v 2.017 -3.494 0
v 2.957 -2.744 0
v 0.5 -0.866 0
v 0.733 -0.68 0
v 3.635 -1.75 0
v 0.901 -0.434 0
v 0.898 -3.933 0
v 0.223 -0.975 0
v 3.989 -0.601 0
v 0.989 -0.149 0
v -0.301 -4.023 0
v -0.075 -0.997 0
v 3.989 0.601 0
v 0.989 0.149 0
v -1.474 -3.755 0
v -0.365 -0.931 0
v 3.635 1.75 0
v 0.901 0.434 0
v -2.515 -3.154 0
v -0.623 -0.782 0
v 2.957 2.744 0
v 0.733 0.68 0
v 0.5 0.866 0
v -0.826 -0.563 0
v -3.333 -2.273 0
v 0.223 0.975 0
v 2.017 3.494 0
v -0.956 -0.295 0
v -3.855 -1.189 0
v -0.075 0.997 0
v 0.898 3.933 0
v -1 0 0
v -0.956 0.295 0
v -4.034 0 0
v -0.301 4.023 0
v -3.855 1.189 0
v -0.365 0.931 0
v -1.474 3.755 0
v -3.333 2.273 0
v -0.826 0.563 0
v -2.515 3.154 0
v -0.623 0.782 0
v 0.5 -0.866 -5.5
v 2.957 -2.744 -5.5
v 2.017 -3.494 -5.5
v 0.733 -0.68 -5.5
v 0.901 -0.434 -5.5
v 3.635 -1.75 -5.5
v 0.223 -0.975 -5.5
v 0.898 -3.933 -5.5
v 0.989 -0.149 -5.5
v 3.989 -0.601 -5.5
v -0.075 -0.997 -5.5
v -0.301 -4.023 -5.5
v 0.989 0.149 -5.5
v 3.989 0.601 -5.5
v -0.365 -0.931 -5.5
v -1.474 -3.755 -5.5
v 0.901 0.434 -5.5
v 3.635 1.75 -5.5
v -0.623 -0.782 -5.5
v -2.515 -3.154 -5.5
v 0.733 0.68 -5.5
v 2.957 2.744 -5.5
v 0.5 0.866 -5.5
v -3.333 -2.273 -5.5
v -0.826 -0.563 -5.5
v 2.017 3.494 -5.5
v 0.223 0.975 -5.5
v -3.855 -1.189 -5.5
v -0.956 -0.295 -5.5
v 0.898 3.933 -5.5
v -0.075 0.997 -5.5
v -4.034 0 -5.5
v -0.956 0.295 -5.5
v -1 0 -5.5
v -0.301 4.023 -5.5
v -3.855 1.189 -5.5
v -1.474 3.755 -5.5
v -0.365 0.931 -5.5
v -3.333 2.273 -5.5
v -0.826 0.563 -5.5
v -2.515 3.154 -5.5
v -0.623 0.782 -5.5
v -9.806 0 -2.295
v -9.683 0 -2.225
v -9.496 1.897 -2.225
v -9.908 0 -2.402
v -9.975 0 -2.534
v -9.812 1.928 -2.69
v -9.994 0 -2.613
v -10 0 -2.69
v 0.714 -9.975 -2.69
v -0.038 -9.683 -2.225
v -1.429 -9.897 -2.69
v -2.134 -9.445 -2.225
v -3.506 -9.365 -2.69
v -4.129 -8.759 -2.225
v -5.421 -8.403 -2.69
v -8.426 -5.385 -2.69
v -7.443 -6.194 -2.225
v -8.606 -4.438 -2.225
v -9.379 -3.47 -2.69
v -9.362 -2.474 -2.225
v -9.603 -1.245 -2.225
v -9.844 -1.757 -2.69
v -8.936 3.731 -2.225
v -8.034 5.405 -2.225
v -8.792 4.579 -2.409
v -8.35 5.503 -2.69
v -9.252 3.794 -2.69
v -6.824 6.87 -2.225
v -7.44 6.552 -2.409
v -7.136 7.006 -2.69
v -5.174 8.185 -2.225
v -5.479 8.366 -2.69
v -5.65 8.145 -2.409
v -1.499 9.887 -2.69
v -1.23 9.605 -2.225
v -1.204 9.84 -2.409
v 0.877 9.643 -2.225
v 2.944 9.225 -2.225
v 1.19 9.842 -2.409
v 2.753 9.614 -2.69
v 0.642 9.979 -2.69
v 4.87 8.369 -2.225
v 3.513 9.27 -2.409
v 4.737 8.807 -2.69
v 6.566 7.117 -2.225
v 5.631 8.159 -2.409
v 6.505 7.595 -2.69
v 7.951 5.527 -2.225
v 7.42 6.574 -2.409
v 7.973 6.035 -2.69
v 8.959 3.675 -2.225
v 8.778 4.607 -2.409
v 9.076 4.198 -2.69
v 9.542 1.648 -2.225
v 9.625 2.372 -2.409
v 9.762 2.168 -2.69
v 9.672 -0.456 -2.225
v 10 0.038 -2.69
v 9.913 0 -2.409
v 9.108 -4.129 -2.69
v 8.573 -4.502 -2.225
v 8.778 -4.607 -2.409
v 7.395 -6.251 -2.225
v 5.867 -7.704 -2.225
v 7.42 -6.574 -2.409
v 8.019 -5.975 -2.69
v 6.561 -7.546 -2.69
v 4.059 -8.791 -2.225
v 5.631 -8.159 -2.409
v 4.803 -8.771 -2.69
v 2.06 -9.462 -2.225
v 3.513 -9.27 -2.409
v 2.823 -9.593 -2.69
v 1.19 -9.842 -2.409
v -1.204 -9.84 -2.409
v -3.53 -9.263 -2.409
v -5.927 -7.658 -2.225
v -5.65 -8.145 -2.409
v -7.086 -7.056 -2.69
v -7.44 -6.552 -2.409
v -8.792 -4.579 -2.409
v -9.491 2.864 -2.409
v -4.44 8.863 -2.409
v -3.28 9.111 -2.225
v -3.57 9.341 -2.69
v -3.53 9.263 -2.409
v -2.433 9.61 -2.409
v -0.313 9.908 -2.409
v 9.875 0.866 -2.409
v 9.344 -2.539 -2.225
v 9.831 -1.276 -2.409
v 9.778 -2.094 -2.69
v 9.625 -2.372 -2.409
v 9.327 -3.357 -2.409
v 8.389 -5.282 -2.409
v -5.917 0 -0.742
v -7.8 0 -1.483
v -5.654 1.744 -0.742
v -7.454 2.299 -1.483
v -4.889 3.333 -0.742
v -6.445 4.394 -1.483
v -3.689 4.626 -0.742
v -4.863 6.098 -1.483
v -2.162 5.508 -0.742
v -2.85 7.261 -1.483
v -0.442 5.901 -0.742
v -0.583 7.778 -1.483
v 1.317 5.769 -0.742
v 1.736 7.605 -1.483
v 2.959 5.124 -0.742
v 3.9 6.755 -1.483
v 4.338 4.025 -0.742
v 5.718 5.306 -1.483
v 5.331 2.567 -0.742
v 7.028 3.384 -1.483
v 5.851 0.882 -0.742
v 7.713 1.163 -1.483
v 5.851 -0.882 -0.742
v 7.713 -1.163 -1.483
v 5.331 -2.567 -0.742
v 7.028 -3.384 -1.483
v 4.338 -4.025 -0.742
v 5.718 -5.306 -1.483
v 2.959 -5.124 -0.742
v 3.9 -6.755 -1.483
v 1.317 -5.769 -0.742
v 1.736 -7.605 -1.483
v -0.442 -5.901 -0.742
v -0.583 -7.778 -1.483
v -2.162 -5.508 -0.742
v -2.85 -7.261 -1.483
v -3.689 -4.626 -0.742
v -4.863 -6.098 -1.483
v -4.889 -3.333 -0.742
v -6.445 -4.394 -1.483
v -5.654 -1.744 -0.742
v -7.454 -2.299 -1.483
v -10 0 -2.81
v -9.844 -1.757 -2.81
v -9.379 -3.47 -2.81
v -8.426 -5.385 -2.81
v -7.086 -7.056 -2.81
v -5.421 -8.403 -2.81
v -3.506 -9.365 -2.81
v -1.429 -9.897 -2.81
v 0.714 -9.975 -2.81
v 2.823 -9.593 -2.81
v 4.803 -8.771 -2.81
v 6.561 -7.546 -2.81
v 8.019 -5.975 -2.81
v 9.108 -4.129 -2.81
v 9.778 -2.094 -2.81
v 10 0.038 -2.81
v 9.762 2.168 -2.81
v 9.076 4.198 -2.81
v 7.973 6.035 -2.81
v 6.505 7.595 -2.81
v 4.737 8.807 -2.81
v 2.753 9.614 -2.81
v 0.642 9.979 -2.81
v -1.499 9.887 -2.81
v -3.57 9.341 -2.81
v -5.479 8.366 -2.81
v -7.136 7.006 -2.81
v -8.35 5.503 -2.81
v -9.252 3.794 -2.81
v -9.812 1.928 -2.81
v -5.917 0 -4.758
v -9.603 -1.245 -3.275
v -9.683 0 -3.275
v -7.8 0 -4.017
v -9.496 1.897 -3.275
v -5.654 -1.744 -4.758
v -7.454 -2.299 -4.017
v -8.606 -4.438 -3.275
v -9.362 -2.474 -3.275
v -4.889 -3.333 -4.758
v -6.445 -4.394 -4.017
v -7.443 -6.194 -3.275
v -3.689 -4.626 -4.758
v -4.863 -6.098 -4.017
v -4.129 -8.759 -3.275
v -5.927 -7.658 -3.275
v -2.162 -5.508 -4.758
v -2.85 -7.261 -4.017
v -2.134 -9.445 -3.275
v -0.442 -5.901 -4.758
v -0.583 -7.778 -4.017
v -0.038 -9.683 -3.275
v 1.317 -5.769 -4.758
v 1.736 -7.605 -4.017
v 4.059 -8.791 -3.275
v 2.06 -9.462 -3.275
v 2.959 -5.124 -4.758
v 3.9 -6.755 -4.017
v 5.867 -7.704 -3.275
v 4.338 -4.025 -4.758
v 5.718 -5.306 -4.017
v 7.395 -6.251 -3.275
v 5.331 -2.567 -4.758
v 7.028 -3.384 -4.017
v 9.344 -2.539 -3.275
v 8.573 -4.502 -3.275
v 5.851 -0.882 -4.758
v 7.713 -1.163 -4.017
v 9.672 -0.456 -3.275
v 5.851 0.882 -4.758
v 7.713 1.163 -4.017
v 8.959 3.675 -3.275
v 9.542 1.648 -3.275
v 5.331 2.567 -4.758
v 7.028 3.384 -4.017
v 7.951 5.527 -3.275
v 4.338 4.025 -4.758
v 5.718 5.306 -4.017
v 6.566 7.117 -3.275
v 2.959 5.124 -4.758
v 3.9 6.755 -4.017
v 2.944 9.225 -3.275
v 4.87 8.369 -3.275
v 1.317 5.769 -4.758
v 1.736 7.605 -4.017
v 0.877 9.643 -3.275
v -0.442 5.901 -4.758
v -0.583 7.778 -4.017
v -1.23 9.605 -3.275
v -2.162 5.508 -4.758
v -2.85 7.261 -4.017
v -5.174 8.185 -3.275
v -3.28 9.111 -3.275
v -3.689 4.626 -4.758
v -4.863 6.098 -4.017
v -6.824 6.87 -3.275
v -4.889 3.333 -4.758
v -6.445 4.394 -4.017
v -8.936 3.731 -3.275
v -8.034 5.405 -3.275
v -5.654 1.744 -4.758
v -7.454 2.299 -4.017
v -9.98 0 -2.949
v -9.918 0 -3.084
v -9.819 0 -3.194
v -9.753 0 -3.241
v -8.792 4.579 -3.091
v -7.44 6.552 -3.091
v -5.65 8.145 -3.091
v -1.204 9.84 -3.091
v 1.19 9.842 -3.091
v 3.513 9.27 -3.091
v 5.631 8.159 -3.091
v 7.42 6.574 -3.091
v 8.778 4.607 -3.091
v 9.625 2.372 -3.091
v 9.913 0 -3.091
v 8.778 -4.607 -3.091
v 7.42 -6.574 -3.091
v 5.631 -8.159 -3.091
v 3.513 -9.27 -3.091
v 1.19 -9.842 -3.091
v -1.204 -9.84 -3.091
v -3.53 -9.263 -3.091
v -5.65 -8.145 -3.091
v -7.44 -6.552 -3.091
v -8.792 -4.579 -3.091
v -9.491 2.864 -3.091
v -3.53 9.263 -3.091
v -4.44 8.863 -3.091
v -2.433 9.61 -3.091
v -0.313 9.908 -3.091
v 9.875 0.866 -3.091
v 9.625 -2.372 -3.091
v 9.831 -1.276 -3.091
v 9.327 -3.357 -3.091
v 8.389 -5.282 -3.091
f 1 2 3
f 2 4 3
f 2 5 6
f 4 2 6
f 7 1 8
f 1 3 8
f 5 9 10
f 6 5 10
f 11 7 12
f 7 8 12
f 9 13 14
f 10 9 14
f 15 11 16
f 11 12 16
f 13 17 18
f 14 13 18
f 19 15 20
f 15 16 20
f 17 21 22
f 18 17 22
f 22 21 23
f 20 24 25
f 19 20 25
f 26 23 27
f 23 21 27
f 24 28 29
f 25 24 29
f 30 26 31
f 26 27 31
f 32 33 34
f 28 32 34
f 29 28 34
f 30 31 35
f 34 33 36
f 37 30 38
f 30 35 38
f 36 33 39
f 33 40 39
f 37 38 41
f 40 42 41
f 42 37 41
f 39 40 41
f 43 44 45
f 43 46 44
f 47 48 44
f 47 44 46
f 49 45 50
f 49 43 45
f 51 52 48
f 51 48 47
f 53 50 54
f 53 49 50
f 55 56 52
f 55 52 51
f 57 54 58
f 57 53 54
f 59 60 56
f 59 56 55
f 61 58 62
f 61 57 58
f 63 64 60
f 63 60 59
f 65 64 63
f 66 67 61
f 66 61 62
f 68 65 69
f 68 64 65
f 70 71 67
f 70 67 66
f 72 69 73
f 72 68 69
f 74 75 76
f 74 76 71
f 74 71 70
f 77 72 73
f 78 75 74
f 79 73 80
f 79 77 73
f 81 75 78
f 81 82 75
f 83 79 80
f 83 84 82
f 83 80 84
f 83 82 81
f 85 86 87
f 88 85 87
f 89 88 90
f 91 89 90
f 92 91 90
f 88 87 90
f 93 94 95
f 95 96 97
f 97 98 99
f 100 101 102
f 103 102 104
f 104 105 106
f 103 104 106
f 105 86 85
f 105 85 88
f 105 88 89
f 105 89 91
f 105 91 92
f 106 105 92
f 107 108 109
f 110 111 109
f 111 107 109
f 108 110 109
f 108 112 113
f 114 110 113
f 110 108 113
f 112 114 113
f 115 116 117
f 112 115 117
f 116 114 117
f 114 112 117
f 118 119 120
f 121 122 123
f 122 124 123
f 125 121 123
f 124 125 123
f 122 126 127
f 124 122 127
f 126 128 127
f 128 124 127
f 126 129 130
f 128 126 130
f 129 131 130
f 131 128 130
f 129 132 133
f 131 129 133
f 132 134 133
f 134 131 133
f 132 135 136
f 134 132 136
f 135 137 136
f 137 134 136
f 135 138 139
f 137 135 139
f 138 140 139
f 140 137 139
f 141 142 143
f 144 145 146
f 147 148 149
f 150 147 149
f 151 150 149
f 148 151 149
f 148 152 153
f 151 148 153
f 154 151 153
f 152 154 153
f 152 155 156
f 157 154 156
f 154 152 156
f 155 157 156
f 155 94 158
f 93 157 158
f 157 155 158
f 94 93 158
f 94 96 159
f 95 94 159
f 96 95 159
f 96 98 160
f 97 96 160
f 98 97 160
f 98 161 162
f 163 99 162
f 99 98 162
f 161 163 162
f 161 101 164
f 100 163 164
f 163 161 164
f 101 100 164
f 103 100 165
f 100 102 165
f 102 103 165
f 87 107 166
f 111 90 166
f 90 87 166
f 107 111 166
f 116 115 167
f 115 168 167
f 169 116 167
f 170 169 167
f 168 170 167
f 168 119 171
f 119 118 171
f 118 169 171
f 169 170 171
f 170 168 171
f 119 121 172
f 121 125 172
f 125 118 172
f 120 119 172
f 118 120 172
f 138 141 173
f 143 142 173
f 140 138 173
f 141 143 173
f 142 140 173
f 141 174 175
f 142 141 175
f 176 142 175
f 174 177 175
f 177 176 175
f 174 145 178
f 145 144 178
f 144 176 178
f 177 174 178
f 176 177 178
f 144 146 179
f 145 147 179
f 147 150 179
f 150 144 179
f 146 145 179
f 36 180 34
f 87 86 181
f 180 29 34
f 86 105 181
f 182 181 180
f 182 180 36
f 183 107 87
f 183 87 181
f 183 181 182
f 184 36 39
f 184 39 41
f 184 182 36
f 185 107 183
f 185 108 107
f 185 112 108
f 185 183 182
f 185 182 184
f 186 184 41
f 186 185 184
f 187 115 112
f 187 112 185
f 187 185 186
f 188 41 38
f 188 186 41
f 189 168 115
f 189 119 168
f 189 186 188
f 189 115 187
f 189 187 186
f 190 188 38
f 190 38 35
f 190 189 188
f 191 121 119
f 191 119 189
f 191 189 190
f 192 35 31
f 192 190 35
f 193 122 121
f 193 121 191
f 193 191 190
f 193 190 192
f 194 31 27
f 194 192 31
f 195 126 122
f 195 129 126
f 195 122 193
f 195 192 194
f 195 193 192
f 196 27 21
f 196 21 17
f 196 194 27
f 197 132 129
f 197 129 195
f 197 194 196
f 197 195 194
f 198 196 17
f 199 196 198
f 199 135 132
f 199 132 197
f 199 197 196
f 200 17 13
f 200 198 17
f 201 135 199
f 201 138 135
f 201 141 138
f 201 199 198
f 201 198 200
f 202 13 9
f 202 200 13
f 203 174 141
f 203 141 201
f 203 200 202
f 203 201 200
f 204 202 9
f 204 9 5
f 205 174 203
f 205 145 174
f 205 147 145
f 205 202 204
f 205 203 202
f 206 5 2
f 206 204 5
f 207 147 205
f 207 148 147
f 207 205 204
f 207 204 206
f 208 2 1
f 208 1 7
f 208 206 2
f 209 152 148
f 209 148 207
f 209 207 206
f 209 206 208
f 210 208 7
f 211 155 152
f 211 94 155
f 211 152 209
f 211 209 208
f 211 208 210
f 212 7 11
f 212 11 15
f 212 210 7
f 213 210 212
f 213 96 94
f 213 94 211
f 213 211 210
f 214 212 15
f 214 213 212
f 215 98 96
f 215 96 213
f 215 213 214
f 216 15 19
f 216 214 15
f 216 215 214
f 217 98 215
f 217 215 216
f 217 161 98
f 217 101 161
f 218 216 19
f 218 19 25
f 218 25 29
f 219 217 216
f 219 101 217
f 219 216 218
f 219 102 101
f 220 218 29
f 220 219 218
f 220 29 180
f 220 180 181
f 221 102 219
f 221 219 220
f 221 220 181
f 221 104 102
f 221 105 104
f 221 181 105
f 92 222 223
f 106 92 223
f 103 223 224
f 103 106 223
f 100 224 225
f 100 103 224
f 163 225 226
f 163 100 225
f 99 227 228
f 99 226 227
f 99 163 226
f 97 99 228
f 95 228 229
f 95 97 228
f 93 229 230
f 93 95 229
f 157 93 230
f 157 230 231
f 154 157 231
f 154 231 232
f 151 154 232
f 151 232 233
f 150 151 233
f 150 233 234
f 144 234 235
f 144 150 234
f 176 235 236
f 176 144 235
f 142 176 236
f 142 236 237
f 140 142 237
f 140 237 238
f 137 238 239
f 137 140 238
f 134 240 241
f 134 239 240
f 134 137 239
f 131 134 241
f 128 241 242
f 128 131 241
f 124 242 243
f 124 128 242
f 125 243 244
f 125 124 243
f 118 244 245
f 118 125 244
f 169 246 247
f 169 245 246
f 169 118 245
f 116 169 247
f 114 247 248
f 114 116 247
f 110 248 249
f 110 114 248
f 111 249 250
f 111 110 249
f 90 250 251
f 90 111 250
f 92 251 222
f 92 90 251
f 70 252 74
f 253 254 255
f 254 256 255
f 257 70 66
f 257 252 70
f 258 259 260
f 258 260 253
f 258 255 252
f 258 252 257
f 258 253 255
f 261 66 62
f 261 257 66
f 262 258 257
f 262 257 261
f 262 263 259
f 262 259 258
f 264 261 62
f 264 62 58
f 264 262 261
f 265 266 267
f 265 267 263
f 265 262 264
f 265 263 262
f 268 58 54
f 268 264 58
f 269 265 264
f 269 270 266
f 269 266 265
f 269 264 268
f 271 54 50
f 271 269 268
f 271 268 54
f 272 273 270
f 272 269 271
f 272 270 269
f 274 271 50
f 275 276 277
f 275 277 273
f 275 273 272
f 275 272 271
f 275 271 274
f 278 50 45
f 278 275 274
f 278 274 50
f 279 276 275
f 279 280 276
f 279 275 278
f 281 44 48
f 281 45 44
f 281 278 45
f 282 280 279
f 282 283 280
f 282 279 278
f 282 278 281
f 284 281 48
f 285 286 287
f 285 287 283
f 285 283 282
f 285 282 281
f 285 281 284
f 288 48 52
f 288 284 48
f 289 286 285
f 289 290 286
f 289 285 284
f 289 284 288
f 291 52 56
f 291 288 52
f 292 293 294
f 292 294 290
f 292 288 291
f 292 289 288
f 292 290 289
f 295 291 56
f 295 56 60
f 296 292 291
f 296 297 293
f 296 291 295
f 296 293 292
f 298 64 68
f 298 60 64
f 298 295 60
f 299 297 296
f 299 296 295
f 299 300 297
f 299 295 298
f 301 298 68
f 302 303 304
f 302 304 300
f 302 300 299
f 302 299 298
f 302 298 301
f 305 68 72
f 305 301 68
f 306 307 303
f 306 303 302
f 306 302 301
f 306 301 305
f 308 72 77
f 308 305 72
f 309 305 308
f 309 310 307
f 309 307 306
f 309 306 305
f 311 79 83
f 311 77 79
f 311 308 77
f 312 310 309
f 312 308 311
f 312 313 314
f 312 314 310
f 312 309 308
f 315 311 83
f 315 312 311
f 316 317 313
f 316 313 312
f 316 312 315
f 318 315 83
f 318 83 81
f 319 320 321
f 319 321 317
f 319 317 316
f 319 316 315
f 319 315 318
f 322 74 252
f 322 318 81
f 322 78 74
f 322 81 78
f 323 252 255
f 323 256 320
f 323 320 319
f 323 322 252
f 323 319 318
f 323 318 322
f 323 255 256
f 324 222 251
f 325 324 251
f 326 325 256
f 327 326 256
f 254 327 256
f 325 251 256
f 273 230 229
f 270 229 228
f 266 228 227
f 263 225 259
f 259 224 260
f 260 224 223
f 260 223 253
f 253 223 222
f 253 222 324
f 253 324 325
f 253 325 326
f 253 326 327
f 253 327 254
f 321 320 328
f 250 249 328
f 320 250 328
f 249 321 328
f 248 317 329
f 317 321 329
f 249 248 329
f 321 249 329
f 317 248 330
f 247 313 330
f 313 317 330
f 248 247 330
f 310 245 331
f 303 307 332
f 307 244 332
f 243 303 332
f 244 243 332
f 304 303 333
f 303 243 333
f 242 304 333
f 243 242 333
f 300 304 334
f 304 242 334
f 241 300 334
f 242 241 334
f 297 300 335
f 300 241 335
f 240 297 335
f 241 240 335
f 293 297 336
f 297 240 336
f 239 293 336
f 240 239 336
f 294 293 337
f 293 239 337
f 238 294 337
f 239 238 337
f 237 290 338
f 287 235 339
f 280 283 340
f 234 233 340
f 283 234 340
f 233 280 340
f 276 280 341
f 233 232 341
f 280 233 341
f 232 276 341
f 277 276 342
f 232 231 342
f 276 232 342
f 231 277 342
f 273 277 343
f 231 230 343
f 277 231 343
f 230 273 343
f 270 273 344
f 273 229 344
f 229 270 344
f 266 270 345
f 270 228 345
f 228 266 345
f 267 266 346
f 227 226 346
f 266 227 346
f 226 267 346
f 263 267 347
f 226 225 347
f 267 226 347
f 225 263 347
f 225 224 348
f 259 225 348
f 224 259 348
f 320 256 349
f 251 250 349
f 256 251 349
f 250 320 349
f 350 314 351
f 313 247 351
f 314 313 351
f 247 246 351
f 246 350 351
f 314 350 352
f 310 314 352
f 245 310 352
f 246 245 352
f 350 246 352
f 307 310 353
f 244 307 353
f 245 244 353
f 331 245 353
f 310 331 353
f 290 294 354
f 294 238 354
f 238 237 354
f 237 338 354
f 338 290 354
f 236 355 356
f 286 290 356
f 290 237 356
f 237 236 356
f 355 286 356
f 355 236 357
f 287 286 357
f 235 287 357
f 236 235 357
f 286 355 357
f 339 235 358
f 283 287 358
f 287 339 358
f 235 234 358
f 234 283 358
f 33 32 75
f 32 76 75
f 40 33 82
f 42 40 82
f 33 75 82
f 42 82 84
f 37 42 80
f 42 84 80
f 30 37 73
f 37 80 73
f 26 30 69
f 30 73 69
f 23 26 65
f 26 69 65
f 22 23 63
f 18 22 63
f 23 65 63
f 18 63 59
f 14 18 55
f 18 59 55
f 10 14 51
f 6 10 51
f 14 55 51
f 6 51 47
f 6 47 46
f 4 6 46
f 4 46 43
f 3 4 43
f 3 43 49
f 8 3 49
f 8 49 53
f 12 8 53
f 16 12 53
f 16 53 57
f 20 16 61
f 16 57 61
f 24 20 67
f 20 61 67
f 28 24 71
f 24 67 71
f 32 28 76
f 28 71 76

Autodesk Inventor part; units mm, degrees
ref_plane "YZ Plane" through (0, 0, 0) normal (1, 0, 0) x (0, 1, 0)
ref_plane "XZ Plane" through (0, 0, 0) normal (0, 1, 0) x (-1, 0, 0)
sketch "Sketch1" plane through (0, 0, 0) normal (0, 1, 0) x (-1, 0, 0)
  line L0 (0, 0) -> (0, -5.5)
  line L1 (0, -5.5) -> (4.0342, -5.5)
  line L2 (4.0342, -5.5) -> (10, -3.15)
  line L3 (10, -3.15) -> (10, -2.35)
  line L4 (10, -2.35) -> (4.0342, 0)
  line L5 (4.0342, 0) -> (0, 0)
  point P0 (10, -2.75)
  dimension "d0" = 43
  dimension "d2" = 0.8
  dimension "d3" = 10
  dimension "d4" = 5.5
revolve "Revolution1" add sketch "Sketch1" angle 360 about axis through (0, 0, 0) along (0, 0, -1)
sketch "Sketch2" plane through (0, 0, -5.5) normal (0, 0, -1) x (-1, 0, 0)
  circle A0 centre (0, 0) radius 4.0342 projected
  circle A1 centre (0, 0) radius 1
  dimension "d6" = 2
extrude "Extrusion1" cut sketch "Sketch2" against normal through all contours A1
ref_plane "Work Plane1" through (0, 0, -2.75) normal (0, 0, -1) x (-1, 0, 0)
fillet "Fillet1" radius 0.5 2 edges at (10, 0, -2.35) (10, 0, -3.15)
properties part number "pritlacne_kolecko"
